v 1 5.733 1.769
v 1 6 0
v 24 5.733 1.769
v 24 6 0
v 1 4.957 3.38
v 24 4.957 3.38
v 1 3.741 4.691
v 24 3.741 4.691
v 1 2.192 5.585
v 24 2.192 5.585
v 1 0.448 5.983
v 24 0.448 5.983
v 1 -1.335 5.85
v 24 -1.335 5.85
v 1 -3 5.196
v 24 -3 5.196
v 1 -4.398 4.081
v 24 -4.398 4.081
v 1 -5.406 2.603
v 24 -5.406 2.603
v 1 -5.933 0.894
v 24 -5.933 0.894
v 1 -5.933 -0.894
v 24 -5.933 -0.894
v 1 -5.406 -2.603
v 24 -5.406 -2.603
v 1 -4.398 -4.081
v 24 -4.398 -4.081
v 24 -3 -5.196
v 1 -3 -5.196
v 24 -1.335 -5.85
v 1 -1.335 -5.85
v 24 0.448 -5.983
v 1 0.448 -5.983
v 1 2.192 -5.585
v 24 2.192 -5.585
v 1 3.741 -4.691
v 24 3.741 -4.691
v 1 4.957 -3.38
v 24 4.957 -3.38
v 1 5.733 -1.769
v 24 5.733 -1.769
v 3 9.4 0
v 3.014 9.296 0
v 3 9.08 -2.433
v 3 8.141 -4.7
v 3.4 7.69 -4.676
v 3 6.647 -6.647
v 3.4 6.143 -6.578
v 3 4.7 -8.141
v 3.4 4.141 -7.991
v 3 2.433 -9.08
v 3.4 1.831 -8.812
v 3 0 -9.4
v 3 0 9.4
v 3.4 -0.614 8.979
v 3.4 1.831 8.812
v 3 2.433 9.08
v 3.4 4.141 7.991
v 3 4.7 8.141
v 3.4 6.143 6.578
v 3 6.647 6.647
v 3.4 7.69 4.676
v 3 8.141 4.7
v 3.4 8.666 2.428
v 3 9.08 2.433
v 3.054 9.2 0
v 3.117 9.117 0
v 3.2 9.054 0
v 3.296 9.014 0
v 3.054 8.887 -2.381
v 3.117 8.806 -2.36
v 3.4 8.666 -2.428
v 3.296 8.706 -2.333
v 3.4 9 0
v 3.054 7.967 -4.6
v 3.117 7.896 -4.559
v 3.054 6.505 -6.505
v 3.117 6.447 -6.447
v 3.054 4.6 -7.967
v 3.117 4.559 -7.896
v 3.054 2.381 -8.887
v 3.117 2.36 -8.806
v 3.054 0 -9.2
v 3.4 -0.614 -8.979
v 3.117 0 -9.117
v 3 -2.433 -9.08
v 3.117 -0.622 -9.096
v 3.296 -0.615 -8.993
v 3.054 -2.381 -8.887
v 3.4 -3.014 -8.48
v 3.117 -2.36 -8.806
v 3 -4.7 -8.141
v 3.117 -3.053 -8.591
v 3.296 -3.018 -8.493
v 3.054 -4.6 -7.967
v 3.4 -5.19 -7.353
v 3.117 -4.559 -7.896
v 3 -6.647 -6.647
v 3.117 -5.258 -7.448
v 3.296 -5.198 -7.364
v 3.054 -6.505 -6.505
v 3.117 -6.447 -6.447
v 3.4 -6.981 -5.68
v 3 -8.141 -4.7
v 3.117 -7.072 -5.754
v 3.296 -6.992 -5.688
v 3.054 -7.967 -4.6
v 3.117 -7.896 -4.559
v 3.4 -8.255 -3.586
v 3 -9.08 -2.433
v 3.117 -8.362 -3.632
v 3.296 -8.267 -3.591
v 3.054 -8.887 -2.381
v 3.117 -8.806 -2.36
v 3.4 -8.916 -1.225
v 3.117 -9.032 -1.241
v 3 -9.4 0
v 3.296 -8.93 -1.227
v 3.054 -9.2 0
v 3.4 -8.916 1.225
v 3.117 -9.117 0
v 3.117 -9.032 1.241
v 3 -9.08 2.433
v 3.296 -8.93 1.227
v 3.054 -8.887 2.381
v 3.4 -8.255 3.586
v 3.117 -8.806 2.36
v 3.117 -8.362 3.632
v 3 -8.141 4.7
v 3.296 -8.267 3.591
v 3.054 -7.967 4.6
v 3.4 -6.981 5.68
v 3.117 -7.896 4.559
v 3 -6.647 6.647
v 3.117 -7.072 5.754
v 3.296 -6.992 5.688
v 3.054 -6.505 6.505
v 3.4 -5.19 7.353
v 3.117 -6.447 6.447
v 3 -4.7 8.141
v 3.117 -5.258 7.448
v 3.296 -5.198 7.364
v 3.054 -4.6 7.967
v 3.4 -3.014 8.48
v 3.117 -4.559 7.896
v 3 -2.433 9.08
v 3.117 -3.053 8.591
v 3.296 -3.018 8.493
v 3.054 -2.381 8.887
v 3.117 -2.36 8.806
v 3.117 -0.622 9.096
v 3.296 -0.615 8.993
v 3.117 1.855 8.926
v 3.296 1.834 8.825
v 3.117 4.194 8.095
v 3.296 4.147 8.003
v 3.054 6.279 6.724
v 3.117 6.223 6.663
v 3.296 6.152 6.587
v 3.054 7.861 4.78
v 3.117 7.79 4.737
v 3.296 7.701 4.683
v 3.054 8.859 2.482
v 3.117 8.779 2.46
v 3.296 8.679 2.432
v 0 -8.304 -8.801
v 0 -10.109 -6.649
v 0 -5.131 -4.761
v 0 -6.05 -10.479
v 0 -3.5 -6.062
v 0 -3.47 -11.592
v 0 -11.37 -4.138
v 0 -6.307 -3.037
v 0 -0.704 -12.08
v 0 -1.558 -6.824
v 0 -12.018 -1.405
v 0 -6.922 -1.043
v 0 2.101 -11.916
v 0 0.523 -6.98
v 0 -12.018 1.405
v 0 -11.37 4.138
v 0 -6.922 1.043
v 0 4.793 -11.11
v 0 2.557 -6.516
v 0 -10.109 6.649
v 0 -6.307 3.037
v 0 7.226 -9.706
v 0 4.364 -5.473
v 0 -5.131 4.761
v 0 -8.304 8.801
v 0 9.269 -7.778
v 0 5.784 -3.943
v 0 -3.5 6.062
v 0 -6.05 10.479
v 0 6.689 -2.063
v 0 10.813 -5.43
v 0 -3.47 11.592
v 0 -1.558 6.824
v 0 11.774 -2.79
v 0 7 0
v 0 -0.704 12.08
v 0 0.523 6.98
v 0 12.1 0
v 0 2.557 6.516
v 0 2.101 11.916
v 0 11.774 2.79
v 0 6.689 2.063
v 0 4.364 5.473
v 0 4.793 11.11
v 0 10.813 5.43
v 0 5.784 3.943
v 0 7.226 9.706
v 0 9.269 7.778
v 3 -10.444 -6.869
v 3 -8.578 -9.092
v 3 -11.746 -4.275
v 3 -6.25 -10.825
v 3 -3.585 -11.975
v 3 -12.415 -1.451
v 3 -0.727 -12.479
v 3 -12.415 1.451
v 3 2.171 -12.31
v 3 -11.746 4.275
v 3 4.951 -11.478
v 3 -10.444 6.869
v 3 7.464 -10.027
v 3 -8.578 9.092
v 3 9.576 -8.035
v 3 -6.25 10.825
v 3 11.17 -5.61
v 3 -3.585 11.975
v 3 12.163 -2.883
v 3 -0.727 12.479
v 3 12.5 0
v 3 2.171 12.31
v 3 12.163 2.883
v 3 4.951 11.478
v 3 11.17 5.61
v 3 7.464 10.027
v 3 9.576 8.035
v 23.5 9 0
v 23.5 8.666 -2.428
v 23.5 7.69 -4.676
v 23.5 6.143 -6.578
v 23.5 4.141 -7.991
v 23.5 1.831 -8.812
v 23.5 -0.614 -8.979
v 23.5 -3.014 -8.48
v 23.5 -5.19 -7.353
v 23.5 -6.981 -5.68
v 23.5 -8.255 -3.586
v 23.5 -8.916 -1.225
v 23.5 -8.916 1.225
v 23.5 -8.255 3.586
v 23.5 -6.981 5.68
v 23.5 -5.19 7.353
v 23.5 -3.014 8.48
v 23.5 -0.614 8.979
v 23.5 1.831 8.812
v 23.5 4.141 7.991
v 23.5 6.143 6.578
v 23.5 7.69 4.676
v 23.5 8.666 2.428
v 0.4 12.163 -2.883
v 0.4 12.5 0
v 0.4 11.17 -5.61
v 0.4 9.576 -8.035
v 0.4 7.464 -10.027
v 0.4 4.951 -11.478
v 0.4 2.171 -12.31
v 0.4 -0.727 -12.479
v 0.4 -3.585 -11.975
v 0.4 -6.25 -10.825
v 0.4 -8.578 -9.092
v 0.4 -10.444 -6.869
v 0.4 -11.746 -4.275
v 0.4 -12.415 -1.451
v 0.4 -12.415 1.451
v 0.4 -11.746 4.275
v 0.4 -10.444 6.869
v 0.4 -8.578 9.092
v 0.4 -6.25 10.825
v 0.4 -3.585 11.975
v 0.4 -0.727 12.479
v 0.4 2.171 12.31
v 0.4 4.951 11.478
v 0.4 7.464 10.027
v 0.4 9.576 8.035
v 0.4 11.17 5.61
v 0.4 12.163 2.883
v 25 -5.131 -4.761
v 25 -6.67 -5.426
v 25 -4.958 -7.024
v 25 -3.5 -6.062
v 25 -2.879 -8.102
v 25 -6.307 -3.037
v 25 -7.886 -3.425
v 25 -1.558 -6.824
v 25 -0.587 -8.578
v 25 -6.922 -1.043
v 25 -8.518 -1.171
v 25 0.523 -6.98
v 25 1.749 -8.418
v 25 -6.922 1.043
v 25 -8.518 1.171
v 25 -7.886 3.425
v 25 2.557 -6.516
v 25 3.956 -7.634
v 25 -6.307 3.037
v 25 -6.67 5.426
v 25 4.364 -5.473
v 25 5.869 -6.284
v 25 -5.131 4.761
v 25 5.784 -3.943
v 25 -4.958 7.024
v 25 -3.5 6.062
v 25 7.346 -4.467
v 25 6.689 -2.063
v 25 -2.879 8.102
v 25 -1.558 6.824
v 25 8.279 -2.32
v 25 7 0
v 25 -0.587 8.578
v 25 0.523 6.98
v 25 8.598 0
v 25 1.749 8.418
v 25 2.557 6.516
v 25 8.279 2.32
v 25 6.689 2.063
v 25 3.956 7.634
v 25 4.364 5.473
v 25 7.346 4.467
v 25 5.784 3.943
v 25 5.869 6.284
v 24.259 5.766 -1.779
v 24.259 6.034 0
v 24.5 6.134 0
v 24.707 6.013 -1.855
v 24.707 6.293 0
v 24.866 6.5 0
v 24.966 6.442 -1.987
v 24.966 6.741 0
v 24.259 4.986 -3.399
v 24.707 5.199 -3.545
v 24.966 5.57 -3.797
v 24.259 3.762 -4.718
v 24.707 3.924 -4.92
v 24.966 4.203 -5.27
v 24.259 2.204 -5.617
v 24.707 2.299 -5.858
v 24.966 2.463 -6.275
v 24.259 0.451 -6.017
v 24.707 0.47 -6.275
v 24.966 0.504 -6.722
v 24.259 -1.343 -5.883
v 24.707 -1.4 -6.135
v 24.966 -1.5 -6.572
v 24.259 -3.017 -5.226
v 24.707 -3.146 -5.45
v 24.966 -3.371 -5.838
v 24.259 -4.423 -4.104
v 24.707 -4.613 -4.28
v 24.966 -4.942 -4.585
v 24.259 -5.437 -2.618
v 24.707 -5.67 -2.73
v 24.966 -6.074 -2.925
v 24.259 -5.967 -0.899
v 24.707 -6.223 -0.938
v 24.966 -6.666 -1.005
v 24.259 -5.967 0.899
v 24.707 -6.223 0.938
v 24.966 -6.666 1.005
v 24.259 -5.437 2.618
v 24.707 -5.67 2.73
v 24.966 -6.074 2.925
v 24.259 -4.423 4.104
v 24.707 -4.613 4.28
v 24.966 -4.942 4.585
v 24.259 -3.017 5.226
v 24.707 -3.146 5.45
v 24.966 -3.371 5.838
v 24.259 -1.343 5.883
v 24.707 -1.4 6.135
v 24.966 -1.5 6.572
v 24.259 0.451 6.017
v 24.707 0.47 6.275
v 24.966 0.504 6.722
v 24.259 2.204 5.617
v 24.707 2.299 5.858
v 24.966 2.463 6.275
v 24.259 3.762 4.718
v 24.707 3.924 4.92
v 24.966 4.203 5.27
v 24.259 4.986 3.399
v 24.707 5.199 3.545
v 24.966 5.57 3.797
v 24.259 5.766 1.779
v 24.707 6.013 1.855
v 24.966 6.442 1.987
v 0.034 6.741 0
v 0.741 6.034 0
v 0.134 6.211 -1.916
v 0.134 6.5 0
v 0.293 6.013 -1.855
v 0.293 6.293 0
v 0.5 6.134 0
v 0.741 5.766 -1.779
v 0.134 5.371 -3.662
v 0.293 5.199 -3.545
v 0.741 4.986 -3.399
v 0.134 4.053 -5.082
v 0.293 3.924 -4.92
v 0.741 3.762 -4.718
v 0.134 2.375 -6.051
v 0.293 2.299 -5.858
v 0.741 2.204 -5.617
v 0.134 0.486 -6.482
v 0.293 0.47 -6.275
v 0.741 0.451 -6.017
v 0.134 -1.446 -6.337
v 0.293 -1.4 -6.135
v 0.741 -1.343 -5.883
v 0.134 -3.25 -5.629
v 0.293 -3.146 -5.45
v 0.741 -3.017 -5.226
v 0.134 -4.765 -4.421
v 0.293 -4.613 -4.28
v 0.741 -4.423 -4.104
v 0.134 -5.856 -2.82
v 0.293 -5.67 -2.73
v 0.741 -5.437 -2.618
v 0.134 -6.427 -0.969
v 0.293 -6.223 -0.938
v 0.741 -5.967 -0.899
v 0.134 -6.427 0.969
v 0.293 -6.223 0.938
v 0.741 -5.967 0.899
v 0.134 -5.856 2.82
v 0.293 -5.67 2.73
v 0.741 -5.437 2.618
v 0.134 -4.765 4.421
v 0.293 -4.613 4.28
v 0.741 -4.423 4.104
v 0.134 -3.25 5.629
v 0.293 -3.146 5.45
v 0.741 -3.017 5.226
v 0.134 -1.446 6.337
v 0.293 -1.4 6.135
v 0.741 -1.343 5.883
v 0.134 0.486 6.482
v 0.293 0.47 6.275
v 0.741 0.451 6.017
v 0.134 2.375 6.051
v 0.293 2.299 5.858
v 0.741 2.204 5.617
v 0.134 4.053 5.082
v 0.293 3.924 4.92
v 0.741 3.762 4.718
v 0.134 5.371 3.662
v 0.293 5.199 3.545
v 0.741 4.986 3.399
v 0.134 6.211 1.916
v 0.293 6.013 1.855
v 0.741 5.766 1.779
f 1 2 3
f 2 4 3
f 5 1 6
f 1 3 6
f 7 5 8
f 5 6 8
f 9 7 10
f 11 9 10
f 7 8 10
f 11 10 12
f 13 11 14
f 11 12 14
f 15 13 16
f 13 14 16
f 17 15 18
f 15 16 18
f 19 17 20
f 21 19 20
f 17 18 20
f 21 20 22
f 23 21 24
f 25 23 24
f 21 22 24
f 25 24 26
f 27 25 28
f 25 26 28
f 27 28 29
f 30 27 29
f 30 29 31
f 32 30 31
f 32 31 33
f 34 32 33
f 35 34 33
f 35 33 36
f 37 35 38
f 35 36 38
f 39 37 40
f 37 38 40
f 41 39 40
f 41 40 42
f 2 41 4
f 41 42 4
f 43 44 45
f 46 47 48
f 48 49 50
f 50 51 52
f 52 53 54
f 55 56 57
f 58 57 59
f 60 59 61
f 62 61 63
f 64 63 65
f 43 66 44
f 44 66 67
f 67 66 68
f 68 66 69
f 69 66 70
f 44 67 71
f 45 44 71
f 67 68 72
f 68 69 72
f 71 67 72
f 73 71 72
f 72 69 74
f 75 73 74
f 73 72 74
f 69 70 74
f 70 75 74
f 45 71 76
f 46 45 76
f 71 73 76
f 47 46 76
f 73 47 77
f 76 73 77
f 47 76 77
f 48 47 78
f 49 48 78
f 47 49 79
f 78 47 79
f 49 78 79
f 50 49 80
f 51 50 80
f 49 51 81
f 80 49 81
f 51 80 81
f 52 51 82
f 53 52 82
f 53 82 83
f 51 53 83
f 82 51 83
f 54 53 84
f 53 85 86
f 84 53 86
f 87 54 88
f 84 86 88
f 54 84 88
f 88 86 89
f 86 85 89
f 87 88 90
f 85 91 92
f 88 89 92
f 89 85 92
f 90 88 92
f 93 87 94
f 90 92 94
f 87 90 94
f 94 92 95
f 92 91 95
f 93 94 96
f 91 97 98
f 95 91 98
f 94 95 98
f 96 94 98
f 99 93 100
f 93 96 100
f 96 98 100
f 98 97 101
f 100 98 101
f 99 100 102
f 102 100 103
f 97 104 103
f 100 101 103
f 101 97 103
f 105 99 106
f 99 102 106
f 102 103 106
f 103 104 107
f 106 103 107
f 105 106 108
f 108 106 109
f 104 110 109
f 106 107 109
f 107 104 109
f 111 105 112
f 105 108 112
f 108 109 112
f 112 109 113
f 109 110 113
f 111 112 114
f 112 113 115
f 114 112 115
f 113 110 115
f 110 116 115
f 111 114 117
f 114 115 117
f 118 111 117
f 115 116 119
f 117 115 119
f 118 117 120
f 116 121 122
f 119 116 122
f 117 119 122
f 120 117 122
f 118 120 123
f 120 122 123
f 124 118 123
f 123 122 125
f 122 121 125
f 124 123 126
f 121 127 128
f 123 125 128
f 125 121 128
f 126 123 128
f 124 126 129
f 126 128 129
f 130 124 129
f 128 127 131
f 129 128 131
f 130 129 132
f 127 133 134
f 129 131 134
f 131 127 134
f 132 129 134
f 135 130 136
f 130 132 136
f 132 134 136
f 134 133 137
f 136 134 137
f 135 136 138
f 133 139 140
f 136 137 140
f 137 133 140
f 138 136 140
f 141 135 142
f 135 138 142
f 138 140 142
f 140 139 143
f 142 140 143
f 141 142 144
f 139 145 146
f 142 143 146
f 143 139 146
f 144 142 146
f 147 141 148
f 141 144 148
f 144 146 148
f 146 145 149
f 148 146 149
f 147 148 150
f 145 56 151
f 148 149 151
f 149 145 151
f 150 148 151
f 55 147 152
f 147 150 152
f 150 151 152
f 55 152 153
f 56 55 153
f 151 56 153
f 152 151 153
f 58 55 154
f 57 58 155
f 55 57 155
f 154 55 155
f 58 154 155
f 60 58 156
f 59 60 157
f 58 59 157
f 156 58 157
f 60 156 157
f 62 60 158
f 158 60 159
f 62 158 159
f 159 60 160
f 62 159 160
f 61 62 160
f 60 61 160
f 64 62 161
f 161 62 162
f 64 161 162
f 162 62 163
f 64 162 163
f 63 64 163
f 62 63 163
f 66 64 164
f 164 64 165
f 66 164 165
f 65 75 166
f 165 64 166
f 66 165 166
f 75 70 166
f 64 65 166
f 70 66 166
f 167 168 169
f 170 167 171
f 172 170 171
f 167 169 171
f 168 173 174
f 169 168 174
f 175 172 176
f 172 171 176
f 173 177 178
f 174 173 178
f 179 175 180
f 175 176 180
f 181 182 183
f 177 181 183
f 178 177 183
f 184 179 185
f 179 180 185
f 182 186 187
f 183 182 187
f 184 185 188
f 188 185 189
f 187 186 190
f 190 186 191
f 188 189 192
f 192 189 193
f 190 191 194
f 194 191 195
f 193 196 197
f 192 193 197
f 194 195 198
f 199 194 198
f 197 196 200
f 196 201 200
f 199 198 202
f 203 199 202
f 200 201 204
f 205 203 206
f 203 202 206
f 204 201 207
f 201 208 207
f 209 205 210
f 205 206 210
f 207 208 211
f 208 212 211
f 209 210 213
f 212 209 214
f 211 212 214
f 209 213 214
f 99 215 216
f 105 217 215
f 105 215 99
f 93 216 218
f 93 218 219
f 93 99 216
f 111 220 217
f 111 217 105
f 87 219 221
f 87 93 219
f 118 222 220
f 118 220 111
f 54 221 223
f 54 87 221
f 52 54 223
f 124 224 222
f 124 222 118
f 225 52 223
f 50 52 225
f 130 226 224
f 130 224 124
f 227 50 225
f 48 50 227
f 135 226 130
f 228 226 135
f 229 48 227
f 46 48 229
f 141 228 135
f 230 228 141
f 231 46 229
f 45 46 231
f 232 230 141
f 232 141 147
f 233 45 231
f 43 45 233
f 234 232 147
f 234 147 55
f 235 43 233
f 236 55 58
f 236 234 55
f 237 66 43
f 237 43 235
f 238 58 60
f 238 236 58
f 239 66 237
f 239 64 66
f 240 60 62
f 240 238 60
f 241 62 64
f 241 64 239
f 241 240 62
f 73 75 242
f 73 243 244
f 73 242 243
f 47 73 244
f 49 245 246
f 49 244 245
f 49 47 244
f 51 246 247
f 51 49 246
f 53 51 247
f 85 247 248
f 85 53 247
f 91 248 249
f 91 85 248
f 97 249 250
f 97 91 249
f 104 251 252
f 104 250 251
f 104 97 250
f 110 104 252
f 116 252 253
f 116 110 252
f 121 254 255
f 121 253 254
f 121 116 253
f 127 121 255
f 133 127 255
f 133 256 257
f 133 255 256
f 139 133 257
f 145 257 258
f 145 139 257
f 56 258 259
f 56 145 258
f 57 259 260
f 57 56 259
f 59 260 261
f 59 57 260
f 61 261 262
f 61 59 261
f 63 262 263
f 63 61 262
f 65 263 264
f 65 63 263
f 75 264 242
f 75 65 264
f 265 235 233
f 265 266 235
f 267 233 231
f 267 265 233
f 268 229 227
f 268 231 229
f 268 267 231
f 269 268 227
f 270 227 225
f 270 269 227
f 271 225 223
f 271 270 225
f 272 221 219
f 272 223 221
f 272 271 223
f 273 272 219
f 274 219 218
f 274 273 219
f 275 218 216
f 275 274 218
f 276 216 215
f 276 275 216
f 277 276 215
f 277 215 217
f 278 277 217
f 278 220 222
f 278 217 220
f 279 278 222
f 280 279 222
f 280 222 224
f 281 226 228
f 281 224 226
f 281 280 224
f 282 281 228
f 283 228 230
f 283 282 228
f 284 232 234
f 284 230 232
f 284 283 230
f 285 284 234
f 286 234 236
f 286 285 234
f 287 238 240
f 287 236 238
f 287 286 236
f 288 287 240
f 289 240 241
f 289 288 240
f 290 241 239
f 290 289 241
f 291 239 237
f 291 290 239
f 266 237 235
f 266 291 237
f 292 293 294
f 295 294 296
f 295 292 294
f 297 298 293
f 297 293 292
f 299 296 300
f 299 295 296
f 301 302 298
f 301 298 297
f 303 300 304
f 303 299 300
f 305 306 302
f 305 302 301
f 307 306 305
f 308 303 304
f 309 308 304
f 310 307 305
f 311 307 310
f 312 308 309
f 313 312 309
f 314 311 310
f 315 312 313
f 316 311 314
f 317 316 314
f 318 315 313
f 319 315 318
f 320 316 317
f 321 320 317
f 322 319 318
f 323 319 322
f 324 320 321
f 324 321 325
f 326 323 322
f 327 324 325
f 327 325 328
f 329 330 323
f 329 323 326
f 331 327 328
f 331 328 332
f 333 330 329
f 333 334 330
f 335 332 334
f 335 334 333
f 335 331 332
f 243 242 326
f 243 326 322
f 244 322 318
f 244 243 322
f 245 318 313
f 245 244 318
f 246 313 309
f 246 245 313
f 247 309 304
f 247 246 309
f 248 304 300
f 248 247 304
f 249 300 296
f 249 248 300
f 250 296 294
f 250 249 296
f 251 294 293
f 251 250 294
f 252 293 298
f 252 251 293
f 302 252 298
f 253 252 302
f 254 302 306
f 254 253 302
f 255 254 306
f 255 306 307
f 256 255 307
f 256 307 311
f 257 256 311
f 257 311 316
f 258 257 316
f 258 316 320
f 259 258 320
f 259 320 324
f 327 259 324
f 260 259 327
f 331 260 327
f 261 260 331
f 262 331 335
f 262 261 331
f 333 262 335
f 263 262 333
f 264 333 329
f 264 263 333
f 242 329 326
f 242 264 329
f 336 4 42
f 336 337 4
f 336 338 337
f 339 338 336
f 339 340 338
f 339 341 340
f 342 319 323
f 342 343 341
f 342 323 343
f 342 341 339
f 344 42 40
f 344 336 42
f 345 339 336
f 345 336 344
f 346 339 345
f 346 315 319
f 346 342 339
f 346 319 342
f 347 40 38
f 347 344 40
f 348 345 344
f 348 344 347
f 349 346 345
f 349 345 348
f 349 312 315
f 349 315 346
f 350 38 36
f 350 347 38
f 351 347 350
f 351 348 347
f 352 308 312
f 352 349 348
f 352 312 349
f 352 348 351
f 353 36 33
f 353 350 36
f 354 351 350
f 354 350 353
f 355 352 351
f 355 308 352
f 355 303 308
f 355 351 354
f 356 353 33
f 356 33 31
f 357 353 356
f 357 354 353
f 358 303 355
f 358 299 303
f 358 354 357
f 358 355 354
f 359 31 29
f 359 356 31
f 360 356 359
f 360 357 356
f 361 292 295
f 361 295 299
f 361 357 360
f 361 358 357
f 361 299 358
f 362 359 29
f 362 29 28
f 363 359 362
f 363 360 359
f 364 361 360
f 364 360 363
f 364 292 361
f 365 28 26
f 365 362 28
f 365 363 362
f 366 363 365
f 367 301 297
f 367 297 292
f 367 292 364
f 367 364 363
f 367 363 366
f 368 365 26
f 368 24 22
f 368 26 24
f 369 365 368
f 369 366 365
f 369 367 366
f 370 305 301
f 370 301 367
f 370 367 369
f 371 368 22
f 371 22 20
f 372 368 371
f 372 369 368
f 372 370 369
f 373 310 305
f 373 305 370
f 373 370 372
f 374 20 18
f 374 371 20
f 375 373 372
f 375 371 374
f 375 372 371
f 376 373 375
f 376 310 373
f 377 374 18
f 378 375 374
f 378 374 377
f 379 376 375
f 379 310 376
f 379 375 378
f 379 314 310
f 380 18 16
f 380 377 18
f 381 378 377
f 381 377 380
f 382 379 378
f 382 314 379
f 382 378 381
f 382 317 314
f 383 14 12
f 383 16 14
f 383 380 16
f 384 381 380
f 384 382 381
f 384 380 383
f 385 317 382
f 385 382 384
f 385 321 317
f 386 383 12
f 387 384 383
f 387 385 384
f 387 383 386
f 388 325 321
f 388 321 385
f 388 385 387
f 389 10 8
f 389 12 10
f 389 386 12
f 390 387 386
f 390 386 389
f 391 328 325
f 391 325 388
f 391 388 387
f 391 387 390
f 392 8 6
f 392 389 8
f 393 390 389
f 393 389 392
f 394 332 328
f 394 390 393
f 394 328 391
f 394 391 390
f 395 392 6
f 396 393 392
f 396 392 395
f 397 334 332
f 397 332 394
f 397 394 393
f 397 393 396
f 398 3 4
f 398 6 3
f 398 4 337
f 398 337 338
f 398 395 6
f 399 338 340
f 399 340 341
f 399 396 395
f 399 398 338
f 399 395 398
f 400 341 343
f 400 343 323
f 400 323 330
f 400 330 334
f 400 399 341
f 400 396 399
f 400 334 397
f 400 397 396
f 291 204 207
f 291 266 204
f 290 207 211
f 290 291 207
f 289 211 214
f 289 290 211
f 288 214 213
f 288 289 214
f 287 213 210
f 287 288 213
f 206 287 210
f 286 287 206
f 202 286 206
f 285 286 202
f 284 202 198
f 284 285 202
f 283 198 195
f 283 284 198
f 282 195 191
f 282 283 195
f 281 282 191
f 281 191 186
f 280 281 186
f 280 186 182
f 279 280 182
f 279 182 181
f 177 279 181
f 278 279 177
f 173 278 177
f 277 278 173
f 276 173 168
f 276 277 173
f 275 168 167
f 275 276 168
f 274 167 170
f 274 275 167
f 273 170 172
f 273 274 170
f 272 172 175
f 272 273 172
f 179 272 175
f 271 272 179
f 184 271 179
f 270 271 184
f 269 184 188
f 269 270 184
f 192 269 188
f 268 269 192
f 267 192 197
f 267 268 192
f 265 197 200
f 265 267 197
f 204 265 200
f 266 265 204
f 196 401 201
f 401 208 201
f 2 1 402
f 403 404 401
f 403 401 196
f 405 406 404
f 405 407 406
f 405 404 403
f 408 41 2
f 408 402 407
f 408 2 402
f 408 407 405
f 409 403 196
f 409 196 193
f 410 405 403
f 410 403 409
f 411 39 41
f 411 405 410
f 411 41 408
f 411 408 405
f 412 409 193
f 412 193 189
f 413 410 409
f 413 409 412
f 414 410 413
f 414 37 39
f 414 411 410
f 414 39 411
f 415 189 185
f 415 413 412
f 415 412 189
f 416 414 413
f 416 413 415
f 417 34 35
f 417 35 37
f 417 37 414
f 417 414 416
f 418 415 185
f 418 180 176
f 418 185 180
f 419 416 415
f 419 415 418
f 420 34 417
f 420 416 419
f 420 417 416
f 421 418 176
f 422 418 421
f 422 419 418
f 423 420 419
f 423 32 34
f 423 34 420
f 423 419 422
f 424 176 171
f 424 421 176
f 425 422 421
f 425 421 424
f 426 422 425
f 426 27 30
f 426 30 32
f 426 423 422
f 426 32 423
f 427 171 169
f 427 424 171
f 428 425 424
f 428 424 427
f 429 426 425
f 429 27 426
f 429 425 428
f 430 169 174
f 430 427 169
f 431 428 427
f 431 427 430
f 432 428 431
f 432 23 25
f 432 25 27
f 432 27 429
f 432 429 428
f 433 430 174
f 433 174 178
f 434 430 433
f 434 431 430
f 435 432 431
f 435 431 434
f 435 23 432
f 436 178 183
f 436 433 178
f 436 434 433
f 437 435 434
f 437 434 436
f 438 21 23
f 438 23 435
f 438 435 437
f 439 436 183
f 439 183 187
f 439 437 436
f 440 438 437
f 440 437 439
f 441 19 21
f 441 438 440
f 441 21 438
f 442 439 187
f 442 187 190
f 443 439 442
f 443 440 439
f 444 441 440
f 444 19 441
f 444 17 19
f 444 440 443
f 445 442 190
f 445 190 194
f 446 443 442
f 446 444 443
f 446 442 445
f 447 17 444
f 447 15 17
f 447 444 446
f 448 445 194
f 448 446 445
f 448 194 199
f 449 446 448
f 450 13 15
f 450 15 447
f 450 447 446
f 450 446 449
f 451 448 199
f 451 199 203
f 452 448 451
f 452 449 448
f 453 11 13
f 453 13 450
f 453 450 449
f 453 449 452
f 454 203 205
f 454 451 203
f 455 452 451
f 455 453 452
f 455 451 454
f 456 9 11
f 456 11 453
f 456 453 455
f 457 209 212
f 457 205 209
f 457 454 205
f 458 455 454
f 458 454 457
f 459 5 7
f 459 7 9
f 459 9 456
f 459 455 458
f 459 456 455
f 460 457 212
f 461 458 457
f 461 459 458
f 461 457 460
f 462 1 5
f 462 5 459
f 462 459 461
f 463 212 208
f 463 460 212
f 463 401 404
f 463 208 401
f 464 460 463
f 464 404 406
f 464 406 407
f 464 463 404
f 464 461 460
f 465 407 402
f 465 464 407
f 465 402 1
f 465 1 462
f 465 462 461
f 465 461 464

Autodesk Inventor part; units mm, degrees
ref_plane "YZ Plane" through (0, 0, 0) normal (1, 0, 0) x (0, 1, 0)
ref_plane "XZ Plane" through (0, 0, 0) normal (0, 1, 0) x (-1, 0, 0)
ref_plane "XY Plane" through (0, 0, 0) normal (0, 0, 1) x (1, 0, 0)
sketch "Sketch_1" plane through (0, 0, 0) normal (0, 0, 1) x (1, 0, 0)
  line L0 (25, 0) -> (0, 0)
  line L1 (0, 12.1) -> (0, 7)
  arc A0 (0, 7) -> (1, 6) centre (1, 7) ccw
  line L2 (1, 6) -> (24, 6)
  arc A1 (24, 6) -> (25, 7) centre (24, 7) ccw
  line L3 (25, 7) -> (25, 8.5981)
  line L4 (25, 8.5981) -> (23.5, 9)
  line L5 (23.5, 9) -> (3.4, 9)
  arc A2 (3, 9.4) -> (3.4, 9) centre (3.4, 9.4) ccw
  line L6 (3, 9.4) -> (3, 12.5)
  line L7 (3, 12.5) -> (0.4, 12.5)
  line L8 (0.4, 12.5) -> (0, 12.1)
revolve "Revolution1" add sketch "Sketch_1" angle 360 about axis through (25, 0, 0) along (1, 0, 0)
properties part number "SHFZ12_25"
